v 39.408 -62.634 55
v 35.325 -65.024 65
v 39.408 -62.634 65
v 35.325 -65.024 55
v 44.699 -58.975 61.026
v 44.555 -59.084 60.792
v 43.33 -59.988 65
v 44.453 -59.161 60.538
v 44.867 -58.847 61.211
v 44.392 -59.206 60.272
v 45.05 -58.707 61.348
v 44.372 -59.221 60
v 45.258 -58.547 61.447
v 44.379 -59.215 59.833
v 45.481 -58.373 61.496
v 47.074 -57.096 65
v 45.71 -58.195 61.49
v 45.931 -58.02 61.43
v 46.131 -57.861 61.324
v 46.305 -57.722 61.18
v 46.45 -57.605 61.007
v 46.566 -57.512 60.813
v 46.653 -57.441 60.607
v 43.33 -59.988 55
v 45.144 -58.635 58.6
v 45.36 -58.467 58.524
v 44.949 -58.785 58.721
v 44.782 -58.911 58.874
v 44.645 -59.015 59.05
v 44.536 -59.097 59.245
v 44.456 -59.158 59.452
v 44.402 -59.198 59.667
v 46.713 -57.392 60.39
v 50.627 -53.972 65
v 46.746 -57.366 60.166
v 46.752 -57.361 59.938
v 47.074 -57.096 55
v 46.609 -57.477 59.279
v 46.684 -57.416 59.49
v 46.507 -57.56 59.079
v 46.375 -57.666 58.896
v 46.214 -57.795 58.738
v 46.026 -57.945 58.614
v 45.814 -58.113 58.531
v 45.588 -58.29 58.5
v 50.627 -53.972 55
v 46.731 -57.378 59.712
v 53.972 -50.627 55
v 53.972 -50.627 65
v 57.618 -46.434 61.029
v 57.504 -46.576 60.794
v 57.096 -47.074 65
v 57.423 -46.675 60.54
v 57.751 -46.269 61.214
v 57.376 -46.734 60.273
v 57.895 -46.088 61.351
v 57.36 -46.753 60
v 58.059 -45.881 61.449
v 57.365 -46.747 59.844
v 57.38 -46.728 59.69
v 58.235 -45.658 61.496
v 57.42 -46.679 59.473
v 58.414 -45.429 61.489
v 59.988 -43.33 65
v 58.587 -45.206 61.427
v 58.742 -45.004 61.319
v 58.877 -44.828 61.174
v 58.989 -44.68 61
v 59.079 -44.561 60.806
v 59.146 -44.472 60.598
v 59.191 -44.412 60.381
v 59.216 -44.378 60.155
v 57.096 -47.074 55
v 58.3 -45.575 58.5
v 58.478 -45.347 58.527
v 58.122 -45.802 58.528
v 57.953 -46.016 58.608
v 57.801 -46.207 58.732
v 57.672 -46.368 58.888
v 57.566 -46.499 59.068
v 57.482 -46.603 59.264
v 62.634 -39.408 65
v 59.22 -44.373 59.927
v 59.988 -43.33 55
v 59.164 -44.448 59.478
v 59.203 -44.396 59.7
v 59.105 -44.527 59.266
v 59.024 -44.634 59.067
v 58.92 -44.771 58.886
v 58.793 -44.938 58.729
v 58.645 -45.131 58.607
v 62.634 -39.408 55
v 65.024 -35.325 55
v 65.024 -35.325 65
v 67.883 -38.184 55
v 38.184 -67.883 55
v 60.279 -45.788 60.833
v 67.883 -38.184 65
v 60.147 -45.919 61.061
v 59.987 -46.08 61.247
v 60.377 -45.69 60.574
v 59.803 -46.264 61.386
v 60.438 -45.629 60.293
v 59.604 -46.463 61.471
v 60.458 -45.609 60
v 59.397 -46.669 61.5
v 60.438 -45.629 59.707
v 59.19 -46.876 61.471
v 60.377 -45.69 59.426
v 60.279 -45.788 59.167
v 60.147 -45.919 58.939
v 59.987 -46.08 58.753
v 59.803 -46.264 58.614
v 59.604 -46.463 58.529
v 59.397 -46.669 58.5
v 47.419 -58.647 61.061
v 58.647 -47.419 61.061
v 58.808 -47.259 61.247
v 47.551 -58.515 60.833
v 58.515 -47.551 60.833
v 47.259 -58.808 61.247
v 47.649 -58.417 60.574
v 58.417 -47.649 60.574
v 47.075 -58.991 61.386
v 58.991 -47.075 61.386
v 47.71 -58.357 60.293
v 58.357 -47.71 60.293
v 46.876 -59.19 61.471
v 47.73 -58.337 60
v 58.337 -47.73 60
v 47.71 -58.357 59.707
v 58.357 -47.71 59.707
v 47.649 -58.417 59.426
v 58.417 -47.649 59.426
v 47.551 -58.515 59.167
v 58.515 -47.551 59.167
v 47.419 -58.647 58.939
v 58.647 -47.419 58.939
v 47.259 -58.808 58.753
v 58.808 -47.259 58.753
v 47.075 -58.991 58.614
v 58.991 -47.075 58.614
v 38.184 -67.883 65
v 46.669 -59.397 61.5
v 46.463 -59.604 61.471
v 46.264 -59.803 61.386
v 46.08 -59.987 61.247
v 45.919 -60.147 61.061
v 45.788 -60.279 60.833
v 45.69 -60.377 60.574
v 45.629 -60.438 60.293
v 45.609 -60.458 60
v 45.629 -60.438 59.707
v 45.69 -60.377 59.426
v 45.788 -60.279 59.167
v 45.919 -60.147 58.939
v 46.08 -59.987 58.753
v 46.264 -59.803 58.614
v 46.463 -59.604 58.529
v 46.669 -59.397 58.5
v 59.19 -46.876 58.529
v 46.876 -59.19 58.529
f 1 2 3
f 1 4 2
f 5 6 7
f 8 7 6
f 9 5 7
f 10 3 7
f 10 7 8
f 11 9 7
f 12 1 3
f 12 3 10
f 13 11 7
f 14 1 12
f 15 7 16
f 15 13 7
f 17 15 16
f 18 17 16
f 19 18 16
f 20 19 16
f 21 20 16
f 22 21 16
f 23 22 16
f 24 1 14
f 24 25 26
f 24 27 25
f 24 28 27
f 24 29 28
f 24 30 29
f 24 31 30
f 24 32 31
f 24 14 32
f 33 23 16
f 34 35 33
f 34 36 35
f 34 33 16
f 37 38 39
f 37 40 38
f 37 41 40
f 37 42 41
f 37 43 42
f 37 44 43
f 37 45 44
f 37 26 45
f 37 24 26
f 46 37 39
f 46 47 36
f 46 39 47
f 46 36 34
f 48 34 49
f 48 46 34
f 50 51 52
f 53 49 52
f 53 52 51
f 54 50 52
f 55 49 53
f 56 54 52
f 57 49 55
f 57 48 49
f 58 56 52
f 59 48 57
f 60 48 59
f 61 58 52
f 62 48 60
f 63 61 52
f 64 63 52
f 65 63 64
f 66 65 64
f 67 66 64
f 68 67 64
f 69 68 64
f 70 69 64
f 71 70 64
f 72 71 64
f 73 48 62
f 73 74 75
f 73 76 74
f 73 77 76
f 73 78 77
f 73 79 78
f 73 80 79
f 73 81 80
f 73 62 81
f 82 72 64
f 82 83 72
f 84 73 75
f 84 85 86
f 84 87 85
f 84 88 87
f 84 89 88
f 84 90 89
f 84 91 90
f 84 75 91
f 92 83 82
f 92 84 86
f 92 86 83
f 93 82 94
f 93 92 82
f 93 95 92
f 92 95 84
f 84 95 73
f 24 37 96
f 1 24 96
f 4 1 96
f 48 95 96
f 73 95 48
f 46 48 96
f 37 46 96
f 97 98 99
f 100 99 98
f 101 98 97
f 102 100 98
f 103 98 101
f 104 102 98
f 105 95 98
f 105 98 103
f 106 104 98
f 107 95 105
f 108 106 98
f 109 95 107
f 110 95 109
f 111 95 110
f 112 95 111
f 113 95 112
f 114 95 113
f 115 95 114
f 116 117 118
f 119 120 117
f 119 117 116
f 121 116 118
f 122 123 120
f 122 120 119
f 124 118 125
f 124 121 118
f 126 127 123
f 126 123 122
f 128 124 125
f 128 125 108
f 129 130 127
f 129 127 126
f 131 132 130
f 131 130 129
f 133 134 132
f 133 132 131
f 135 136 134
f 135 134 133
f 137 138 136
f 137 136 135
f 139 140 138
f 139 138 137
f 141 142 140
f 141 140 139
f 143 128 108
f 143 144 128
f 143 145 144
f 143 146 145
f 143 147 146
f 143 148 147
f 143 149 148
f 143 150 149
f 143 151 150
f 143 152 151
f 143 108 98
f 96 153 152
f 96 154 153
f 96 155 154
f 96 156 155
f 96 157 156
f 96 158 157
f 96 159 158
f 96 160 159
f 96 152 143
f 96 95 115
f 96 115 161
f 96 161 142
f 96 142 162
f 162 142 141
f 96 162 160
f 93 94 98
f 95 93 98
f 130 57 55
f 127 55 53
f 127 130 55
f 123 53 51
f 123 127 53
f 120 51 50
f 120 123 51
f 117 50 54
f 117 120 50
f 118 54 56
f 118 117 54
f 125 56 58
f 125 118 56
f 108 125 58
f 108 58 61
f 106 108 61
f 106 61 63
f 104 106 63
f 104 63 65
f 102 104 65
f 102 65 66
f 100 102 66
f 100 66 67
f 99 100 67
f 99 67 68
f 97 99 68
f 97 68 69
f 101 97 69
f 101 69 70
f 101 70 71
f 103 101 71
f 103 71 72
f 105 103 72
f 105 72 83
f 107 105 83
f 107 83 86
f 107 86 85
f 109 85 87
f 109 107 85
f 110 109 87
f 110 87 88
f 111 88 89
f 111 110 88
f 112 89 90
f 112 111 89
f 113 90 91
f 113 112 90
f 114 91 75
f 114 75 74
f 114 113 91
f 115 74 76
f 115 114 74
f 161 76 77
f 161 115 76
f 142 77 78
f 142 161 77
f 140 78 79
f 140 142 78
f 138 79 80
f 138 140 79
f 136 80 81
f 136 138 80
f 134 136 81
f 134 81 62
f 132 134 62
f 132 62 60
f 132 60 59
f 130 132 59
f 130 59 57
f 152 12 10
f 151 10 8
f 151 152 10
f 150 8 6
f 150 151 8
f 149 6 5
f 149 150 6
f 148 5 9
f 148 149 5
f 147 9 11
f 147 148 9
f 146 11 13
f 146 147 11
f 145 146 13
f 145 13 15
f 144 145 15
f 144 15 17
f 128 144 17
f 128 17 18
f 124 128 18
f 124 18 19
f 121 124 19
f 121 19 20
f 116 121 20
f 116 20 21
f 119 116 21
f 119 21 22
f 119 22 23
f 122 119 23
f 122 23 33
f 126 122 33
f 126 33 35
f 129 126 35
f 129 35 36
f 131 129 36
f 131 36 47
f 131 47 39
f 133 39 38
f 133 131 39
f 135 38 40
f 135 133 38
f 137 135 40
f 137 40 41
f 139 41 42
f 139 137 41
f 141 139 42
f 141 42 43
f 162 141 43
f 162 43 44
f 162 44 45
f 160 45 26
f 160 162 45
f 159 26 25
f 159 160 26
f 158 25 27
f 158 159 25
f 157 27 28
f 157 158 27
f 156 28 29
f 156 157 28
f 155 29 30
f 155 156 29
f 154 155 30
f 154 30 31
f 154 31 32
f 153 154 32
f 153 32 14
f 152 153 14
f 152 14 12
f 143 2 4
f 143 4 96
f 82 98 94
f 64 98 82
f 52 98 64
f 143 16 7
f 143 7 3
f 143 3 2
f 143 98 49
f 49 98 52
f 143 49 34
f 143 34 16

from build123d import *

# Parameters (mm, degrees)
CYLINDER1984_R               = 1.5
CYLINDER1984_DEPTH           = 50
COMPOUND1069_PLACEMENT_ANGLE = 225
CYLINDER1985_R               = 1.5
CYLINDER1985_DEPTH           = 50
COMPOUND1070_PLACEMENT_ANGLE = 225
CYLINDER1983_R               = 74
CYLINDER1983_DEPTH           = 40
BOX984_W                     = 42
BOX984_H                     = 8
BOX984_DEPTH                 = 10
COMPOUND1068_PLACEMENT_ANGLE = 225


with BuildPart() as compound1069:
    # Cylinder1984 → Cylinder1984 (new body)
    with BuildSketch(Plane(origin=(9, 100, 59), x_dir=(1, 0, 0), z_dir=(0, -1, 0))):
        Circle(CYLINDER1984_R)
    extrude(amount=CYLINDER1984_DEPTH)


with BuildPart() as compound1069_1:
    # Compound1069 placement: moved
    add(compound1069.part.rotate(Axis((0, 0, 0), (0, 0, 1)), COMPOUND1069_PLACEMENT_ANGLE))


with BuildPart() as compound1071:
    # Cylinder1985 → Cylinder1985 (new body)
    with BuildSketch(Plane(origin=(-9, 100, 59), x_dir=(1, 0, 0), z_dir=(0, -1, 0))):
        Circle(CYLINDER1985_R)
    extrude(amount=CYLINDER1985_DEPTH)


with BuildPart() as compound1071_1:
    # Compound1070 placement: moved
    add(compound1071.part.rotate(Axis((0, 0, 0), (0, 0, 1)), COMPOUND1070_PLACEMENT_ANGLE))

    # Compound1071: union Compound1069
    add(compound1069_1.part)


with BuildPart() as compound1071_2:
    # Compound1071 placement: moved
    add(compound1071_1.part.moved(Location((0, 0, 1))))


with BuildPart() as v_lec1983:
    # Cylinder1983 → Cylinder1983 (new body)
    with BuildSketch(Plane.XY.offset(44)):
        Circle(CYLINDER1983_R)
    extrude(amount=CYLINDER1983_DEPTH)


with BuildPart() as cut668:
    # Box984 → Box984 (new body)
    with BuildSketch(Plane(origin=(-21, -23, 22), x_dir=(1, 0, 0), z_dir=(0, 0, 1))):
        with Locations((21, 4)):
            Rectangle(BOX984_W, BOX984_H)
    extrude(amount=BOX984_DEPTH)


with BuildPart() as cut668_1:
    # Compound1068 placement: moved
    add(cut668.part.moved(Location((63.64, -63.64, 43))).rotate(Axis((63.64, -63.64, 43), (0, 0, 1)), COMPOUND1068_PLACEMENT_ANGLE))

    # Cut667: cut Válec1983
    add(v_lec1983.part, mode=Mode.SUBTRACT)


with BuildPart() as cut668_2:
    # Cut667 placement: moved
    add(cut668_1.part.moved(Location((0, 0, -10))))

    # Cut668: cut Compound1071
    add(compound1071_2.part, mode=Mode.SUBTRACT)


solid = cut668_2.part
